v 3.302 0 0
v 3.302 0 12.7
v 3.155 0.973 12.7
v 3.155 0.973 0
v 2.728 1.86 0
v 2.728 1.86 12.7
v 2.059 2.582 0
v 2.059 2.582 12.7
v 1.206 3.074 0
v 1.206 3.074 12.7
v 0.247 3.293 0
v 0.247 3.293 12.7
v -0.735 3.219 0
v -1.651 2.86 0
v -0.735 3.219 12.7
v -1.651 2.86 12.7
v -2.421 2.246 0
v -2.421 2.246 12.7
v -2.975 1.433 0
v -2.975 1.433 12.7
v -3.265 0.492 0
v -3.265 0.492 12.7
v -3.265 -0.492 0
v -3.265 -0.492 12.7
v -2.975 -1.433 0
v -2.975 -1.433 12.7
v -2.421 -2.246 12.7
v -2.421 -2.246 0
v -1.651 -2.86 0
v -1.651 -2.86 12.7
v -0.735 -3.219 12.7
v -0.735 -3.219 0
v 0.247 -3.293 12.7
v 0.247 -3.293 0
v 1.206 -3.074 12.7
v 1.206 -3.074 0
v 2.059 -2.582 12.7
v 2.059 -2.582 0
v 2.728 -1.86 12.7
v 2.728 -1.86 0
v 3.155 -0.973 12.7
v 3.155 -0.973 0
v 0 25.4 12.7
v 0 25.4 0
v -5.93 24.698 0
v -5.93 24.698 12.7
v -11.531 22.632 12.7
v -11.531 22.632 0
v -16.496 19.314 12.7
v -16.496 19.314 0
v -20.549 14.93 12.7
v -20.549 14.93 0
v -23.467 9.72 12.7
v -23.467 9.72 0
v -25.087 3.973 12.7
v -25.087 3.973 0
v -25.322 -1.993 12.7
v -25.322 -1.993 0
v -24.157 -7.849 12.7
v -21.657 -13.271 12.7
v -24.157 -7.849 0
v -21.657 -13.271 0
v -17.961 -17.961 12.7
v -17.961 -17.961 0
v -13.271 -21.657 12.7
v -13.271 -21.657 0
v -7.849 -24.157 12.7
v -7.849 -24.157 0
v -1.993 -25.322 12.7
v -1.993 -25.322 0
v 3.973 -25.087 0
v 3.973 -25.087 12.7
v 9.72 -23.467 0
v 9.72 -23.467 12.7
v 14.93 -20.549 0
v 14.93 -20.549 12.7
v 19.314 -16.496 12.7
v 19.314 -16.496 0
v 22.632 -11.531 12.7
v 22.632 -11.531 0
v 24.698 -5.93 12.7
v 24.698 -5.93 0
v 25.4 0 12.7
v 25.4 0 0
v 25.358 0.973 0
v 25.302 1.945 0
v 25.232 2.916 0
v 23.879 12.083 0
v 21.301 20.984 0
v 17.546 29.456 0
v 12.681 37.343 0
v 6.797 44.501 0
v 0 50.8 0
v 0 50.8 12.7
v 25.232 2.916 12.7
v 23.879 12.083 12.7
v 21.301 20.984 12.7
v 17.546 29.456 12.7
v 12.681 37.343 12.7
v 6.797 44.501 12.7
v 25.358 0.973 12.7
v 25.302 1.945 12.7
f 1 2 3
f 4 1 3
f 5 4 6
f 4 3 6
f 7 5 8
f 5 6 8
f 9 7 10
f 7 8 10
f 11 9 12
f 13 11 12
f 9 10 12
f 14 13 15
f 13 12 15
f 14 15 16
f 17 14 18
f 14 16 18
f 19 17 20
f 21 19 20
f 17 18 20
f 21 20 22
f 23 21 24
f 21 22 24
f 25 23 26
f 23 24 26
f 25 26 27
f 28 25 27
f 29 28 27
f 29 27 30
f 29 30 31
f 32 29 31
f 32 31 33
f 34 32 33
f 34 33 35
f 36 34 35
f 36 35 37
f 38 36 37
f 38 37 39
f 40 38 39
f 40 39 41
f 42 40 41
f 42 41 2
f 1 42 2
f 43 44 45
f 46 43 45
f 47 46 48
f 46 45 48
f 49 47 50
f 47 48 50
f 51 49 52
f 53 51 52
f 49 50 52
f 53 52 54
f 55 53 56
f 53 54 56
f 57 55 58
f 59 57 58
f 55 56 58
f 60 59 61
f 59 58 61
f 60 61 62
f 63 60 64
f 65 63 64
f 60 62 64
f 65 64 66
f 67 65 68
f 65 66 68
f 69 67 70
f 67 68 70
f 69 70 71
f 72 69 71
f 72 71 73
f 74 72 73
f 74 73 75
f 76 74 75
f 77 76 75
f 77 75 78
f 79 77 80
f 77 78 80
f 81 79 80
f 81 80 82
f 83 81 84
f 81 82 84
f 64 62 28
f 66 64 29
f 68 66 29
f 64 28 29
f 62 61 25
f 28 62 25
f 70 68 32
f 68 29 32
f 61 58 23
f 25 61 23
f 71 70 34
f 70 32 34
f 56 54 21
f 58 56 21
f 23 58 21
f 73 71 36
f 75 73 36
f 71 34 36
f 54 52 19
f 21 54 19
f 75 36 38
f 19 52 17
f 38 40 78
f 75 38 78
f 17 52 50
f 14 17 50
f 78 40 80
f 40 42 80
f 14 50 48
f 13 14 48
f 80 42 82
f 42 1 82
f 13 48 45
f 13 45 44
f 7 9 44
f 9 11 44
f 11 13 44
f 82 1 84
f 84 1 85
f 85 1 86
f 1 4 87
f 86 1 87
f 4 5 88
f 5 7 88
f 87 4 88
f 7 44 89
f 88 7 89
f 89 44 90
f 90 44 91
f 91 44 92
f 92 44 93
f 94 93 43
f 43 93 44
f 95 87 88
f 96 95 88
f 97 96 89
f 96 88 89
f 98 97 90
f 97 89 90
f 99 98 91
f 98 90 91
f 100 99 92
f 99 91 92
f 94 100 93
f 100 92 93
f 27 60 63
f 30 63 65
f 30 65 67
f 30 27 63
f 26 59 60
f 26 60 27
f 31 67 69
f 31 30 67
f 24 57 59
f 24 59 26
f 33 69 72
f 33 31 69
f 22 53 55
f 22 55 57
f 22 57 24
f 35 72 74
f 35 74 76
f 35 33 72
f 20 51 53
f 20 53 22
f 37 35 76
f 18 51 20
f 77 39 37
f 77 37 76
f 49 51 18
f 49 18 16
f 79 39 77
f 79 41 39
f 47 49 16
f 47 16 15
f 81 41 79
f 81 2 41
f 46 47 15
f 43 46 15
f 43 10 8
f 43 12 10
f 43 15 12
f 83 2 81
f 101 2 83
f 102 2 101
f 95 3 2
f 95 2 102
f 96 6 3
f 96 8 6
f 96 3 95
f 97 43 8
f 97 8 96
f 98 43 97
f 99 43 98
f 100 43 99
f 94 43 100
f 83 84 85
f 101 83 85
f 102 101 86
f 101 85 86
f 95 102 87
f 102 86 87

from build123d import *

# Parameters (mm, degrees)
F1_DEPTH = 12.7
F2_R     = 3.302
F3_DEPTH = 25.4


with BuildPart() as f1:
    # F0 (on Top) → F1 (new body)
    with BuildSketch(Plane.XY):
        with BuildLine():
            ThreePointArc((25.232093, 2.915727), (16.898233, 18.963379), (0, 25.4))
            ThreePointArc((0, 25.4), (-17.960512, -17.960512), (25.4, 0))
            ThreePointArc((25.4, 0), (25.331587, 1.458758), (25.232093, 2.915727))
        make_face()
        with BuildLine():
            Line((0, 50.8), (0, 25.4))
            ThreePointArc((0, 25.4), (16.898233, 18.963379), (25.232093, 2.915727))
            ThreePointArc((25.232093, 2.915727), (17.545737, 29.455509), (0, 50.8))
        make_face()
    extrude(amount=F1_DEPTH)

    # F2 (on face) → F3 (cut)
    with BuildSketch(Plane.XY.offset(12.7)):
        Circle(F2_R)
    extrude(amount=-F3_DEPTH, mode=Mode.SUBTRACT)


solid = f1.part
